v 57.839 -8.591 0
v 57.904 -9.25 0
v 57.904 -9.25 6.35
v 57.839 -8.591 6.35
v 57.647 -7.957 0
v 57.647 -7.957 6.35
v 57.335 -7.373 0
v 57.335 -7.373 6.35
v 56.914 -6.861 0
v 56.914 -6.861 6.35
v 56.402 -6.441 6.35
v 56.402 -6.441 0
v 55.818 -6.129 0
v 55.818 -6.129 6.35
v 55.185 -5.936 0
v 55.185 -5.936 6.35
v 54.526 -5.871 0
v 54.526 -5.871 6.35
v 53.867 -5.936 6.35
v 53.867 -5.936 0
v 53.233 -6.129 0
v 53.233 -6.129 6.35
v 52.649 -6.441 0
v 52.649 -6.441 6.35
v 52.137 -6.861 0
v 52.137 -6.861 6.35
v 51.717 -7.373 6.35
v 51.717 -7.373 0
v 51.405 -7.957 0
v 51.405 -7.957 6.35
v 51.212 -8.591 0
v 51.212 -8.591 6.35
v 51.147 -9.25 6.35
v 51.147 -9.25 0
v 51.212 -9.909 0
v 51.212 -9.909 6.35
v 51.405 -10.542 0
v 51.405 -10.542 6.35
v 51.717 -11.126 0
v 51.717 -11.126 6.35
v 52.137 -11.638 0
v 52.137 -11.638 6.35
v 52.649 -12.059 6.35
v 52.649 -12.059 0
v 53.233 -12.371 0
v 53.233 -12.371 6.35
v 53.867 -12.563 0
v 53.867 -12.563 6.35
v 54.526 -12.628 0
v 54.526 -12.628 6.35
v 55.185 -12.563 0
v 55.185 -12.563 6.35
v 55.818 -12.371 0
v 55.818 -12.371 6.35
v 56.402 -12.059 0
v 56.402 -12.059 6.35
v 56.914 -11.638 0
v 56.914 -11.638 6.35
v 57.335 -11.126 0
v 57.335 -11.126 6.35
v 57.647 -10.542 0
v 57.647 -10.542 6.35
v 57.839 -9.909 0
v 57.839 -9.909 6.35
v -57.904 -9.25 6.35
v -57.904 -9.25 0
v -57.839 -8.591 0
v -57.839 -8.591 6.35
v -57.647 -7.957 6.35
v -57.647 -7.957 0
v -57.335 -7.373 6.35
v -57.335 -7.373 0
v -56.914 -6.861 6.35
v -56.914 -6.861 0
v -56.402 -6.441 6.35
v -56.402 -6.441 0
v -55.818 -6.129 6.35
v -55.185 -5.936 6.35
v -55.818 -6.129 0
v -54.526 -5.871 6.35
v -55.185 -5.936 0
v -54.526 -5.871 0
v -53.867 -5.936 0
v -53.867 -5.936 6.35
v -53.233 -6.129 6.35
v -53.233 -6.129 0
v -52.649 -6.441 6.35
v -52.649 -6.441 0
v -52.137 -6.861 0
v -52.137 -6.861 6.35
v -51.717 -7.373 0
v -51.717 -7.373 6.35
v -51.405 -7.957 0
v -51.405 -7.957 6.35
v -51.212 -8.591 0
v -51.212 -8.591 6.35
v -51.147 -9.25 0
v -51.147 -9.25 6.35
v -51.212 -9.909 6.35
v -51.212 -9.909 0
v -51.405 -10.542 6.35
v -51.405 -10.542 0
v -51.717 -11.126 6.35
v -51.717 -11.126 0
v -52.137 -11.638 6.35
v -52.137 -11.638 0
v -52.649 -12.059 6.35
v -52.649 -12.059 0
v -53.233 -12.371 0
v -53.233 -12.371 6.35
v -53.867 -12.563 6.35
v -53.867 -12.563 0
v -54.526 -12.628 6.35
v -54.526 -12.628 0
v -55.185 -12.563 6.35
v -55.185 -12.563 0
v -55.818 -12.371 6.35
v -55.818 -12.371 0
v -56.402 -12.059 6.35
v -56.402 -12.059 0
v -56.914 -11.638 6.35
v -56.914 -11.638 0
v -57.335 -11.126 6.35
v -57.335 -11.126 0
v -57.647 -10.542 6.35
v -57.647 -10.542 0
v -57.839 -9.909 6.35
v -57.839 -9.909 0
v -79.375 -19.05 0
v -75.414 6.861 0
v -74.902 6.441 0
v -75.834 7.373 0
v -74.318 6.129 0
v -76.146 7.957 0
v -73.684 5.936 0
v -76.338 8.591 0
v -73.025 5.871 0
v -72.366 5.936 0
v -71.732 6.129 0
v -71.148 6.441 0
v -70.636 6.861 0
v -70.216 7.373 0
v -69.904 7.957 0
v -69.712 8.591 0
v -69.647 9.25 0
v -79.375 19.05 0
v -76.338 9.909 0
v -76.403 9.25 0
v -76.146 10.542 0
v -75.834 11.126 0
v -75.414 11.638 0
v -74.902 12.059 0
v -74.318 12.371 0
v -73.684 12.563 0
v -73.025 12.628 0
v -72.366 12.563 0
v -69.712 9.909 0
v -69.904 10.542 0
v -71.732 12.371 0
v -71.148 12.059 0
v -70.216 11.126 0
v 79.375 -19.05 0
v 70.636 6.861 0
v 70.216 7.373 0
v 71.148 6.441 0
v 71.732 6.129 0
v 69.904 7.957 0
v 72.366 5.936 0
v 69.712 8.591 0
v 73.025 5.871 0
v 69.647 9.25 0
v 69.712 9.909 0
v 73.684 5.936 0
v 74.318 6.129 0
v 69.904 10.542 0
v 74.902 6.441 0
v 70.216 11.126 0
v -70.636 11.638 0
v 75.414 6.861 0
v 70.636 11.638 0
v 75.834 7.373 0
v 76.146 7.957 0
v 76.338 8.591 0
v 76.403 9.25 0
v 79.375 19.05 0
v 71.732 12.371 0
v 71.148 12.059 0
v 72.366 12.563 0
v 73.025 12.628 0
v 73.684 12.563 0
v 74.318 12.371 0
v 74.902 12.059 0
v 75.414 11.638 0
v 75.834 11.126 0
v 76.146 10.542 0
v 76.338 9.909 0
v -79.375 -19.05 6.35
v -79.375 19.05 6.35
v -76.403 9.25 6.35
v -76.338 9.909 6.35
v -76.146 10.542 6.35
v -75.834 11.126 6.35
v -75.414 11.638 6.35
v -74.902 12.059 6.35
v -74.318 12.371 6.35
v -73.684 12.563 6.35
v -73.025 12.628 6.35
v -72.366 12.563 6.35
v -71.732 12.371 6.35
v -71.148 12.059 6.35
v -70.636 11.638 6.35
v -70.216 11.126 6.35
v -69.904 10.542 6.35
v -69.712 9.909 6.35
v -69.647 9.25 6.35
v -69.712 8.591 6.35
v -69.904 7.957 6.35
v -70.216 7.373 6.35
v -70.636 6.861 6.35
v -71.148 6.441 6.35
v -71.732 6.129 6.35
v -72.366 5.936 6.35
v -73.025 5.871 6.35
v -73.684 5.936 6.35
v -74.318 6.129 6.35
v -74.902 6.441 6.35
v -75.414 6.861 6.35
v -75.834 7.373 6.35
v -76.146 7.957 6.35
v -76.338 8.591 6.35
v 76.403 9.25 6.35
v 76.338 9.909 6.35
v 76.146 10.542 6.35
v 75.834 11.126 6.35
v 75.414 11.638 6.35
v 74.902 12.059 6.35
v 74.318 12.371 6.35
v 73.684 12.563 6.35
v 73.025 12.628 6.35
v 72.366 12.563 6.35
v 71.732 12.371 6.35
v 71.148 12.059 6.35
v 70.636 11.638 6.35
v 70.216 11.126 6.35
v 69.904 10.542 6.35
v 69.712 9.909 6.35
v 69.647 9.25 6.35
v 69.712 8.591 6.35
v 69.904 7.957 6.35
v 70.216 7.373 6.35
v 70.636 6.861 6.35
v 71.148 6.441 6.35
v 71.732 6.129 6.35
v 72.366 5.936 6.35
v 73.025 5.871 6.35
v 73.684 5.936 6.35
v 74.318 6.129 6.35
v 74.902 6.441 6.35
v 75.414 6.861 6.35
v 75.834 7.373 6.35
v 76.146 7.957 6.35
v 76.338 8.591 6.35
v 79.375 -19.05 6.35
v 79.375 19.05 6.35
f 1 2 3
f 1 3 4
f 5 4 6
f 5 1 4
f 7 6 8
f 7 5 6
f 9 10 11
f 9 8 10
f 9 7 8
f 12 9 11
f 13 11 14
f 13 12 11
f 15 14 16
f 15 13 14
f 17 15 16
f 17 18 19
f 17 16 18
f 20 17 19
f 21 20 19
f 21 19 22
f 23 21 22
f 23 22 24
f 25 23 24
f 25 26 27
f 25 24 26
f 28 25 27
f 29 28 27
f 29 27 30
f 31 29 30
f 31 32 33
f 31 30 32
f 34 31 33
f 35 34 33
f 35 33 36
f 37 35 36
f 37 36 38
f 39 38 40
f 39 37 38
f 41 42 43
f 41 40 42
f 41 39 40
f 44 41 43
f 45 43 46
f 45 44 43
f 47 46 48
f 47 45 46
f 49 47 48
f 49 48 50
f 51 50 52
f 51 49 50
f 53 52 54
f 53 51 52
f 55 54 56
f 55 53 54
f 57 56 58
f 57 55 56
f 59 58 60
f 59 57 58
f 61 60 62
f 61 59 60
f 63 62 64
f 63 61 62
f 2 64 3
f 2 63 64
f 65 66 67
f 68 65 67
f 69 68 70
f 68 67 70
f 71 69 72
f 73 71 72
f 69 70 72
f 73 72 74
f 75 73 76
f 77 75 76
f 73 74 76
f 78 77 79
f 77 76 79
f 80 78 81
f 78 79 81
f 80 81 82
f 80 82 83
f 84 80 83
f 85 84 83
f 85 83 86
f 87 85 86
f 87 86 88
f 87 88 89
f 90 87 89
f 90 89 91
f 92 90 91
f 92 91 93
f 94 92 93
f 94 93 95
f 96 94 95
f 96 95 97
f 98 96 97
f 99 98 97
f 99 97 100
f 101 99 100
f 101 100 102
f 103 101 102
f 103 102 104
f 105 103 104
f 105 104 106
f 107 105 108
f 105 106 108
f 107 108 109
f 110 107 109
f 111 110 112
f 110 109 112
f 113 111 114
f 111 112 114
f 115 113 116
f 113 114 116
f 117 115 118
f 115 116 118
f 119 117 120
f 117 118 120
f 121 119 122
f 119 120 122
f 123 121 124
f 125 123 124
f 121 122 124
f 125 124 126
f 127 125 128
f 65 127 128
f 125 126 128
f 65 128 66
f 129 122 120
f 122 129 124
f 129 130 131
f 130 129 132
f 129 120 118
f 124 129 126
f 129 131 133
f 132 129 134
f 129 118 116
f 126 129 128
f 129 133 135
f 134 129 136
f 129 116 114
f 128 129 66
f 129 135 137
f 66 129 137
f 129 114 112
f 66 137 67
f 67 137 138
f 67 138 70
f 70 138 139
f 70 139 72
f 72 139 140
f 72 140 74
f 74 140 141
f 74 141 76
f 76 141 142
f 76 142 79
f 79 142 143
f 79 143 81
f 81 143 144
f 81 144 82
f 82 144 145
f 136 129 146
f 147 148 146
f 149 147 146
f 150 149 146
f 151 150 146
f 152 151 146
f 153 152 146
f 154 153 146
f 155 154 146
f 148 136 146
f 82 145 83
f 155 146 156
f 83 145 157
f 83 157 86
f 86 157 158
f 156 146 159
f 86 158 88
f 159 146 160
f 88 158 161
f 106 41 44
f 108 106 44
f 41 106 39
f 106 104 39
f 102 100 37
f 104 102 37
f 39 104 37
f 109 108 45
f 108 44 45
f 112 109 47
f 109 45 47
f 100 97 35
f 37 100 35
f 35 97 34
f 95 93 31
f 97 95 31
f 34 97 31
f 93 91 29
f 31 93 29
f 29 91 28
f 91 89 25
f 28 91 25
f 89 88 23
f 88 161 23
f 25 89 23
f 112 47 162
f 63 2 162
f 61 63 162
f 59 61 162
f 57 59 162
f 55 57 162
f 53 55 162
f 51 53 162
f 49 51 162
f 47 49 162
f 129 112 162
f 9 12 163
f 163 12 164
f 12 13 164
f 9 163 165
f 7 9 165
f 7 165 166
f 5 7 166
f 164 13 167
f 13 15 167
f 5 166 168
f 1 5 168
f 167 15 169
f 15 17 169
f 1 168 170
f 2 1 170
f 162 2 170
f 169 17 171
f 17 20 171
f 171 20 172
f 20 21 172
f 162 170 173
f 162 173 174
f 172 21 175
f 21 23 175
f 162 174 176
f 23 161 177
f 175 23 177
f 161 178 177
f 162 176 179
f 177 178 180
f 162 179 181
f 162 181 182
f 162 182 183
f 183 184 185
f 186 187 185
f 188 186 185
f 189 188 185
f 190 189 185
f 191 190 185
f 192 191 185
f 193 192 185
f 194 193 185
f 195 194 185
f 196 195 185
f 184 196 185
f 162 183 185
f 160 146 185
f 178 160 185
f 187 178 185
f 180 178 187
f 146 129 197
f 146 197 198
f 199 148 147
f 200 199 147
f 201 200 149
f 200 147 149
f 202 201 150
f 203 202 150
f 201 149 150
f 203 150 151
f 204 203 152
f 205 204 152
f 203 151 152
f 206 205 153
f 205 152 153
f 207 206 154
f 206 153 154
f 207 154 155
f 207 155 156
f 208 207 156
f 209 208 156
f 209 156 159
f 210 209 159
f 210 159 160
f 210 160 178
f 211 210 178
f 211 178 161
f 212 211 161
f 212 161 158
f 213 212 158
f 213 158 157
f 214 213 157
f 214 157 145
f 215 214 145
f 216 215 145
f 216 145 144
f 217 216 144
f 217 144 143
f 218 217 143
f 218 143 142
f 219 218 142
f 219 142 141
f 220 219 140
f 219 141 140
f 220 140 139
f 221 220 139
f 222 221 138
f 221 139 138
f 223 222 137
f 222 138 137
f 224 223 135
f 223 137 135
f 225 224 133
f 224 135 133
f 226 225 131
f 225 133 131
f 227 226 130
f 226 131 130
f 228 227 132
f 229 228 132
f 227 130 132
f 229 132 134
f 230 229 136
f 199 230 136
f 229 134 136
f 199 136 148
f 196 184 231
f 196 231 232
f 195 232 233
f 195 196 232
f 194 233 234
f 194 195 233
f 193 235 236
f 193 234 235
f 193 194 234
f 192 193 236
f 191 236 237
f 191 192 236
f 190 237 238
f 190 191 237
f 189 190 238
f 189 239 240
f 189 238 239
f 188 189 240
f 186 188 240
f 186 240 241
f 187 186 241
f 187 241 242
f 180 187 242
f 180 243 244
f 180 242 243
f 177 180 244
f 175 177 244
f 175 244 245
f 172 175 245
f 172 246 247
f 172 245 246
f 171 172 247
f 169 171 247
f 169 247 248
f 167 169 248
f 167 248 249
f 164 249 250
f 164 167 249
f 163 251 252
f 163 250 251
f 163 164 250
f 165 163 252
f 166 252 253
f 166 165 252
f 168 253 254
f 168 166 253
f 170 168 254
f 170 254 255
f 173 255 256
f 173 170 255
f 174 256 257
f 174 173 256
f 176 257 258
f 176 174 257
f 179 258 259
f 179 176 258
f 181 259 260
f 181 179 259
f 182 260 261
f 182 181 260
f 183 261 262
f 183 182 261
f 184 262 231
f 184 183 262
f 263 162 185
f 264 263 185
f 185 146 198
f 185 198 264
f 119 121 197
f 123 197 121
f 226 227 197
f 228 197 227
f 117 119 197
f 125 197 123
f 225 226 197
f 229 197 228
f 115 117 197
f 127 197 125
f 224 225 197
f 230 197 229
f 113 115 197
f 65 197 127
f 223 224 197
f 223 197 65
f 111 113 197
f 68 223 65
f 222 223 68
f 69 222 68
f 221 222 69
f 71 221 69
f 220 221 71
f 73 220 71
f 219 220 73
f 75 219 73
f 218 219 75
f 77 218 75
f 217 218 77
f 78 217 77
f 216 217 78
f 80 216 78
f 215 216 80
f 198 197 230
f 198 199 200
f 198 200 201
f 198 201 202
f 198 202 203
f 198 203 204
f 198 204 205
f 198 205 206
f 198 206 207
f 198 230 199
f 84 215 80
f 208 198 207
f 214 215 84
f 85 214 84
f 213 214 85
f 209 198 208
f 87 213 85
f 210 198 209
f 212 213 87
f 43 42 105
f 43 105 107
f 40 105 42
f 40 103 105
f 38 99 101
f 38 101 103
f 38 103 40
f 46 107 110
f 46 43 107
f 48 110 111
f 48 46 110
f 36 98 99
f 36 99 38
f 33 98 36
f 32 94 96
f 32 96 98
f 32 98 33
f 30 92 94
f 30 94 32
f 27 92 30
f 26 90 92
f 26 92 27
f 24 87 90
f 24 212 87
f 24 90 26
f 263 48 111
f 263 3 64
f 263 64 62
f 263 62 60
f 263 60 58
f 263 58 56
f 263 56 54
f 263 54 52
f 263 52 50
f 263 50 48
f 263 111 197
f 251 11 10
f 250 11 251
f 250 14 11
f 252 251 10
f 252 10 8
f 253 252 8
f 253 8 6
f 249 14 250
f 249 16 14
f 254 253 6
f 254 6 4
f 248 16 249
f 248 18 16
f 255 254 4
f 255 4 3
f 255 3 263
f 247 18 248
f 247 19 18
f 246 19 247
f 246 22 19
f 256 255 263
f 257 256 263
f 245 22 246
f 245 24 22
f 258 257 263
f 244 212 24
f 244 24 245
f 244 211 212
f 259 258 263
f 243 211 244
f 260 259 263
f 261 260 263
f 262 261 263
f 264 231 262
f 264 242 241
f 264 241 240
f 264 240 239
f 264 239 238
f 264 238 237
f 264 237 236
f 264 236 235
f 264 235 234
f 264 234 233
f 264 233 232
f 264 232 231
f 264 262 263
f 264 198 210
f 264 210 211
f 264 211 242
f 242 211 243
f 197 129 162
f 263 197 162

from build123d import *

# Parameters (mm, degrees)
SKETCH1_W               = 158.75
SKETCH1_H               = 38.1
BOSS_EXTRUDE1_DEPTH     = 6.35
F_1_4_CLEARANCE_HOLE1_D = 6.7564


with BuildPart() as part:
    # Sketch1 → Boss-Extrude1 (new body)
    with BuildSketch(Plane.XY):
        Rectangle(SKETCH1_W, SKETCH1_H)
    extrude(amount=BOSS_EXTRUDE1_DEPTH)

    # 1/4 Clearance Hole1 (through all)
    with Locations(Plane.XY.offset(6.35)):
        with Locations((-73.025, 9.249663805), (-54.525672391, -9.249663805)):
            f_1_4_clearance_hole1 = Hole(F_1_4_CLEARANCE_HOLE1_D / 2)

    # Mirror1: 1/4 Clearance Hole1 across plane
    add(f_1_4_clearance_hole1.mirror(Plane(origin=(0, 0, 0), x_dir=(0, 0, 1), z_dir=(1, 0, 0))), mode=Mode.SUBTRACT)


solid = part.part
